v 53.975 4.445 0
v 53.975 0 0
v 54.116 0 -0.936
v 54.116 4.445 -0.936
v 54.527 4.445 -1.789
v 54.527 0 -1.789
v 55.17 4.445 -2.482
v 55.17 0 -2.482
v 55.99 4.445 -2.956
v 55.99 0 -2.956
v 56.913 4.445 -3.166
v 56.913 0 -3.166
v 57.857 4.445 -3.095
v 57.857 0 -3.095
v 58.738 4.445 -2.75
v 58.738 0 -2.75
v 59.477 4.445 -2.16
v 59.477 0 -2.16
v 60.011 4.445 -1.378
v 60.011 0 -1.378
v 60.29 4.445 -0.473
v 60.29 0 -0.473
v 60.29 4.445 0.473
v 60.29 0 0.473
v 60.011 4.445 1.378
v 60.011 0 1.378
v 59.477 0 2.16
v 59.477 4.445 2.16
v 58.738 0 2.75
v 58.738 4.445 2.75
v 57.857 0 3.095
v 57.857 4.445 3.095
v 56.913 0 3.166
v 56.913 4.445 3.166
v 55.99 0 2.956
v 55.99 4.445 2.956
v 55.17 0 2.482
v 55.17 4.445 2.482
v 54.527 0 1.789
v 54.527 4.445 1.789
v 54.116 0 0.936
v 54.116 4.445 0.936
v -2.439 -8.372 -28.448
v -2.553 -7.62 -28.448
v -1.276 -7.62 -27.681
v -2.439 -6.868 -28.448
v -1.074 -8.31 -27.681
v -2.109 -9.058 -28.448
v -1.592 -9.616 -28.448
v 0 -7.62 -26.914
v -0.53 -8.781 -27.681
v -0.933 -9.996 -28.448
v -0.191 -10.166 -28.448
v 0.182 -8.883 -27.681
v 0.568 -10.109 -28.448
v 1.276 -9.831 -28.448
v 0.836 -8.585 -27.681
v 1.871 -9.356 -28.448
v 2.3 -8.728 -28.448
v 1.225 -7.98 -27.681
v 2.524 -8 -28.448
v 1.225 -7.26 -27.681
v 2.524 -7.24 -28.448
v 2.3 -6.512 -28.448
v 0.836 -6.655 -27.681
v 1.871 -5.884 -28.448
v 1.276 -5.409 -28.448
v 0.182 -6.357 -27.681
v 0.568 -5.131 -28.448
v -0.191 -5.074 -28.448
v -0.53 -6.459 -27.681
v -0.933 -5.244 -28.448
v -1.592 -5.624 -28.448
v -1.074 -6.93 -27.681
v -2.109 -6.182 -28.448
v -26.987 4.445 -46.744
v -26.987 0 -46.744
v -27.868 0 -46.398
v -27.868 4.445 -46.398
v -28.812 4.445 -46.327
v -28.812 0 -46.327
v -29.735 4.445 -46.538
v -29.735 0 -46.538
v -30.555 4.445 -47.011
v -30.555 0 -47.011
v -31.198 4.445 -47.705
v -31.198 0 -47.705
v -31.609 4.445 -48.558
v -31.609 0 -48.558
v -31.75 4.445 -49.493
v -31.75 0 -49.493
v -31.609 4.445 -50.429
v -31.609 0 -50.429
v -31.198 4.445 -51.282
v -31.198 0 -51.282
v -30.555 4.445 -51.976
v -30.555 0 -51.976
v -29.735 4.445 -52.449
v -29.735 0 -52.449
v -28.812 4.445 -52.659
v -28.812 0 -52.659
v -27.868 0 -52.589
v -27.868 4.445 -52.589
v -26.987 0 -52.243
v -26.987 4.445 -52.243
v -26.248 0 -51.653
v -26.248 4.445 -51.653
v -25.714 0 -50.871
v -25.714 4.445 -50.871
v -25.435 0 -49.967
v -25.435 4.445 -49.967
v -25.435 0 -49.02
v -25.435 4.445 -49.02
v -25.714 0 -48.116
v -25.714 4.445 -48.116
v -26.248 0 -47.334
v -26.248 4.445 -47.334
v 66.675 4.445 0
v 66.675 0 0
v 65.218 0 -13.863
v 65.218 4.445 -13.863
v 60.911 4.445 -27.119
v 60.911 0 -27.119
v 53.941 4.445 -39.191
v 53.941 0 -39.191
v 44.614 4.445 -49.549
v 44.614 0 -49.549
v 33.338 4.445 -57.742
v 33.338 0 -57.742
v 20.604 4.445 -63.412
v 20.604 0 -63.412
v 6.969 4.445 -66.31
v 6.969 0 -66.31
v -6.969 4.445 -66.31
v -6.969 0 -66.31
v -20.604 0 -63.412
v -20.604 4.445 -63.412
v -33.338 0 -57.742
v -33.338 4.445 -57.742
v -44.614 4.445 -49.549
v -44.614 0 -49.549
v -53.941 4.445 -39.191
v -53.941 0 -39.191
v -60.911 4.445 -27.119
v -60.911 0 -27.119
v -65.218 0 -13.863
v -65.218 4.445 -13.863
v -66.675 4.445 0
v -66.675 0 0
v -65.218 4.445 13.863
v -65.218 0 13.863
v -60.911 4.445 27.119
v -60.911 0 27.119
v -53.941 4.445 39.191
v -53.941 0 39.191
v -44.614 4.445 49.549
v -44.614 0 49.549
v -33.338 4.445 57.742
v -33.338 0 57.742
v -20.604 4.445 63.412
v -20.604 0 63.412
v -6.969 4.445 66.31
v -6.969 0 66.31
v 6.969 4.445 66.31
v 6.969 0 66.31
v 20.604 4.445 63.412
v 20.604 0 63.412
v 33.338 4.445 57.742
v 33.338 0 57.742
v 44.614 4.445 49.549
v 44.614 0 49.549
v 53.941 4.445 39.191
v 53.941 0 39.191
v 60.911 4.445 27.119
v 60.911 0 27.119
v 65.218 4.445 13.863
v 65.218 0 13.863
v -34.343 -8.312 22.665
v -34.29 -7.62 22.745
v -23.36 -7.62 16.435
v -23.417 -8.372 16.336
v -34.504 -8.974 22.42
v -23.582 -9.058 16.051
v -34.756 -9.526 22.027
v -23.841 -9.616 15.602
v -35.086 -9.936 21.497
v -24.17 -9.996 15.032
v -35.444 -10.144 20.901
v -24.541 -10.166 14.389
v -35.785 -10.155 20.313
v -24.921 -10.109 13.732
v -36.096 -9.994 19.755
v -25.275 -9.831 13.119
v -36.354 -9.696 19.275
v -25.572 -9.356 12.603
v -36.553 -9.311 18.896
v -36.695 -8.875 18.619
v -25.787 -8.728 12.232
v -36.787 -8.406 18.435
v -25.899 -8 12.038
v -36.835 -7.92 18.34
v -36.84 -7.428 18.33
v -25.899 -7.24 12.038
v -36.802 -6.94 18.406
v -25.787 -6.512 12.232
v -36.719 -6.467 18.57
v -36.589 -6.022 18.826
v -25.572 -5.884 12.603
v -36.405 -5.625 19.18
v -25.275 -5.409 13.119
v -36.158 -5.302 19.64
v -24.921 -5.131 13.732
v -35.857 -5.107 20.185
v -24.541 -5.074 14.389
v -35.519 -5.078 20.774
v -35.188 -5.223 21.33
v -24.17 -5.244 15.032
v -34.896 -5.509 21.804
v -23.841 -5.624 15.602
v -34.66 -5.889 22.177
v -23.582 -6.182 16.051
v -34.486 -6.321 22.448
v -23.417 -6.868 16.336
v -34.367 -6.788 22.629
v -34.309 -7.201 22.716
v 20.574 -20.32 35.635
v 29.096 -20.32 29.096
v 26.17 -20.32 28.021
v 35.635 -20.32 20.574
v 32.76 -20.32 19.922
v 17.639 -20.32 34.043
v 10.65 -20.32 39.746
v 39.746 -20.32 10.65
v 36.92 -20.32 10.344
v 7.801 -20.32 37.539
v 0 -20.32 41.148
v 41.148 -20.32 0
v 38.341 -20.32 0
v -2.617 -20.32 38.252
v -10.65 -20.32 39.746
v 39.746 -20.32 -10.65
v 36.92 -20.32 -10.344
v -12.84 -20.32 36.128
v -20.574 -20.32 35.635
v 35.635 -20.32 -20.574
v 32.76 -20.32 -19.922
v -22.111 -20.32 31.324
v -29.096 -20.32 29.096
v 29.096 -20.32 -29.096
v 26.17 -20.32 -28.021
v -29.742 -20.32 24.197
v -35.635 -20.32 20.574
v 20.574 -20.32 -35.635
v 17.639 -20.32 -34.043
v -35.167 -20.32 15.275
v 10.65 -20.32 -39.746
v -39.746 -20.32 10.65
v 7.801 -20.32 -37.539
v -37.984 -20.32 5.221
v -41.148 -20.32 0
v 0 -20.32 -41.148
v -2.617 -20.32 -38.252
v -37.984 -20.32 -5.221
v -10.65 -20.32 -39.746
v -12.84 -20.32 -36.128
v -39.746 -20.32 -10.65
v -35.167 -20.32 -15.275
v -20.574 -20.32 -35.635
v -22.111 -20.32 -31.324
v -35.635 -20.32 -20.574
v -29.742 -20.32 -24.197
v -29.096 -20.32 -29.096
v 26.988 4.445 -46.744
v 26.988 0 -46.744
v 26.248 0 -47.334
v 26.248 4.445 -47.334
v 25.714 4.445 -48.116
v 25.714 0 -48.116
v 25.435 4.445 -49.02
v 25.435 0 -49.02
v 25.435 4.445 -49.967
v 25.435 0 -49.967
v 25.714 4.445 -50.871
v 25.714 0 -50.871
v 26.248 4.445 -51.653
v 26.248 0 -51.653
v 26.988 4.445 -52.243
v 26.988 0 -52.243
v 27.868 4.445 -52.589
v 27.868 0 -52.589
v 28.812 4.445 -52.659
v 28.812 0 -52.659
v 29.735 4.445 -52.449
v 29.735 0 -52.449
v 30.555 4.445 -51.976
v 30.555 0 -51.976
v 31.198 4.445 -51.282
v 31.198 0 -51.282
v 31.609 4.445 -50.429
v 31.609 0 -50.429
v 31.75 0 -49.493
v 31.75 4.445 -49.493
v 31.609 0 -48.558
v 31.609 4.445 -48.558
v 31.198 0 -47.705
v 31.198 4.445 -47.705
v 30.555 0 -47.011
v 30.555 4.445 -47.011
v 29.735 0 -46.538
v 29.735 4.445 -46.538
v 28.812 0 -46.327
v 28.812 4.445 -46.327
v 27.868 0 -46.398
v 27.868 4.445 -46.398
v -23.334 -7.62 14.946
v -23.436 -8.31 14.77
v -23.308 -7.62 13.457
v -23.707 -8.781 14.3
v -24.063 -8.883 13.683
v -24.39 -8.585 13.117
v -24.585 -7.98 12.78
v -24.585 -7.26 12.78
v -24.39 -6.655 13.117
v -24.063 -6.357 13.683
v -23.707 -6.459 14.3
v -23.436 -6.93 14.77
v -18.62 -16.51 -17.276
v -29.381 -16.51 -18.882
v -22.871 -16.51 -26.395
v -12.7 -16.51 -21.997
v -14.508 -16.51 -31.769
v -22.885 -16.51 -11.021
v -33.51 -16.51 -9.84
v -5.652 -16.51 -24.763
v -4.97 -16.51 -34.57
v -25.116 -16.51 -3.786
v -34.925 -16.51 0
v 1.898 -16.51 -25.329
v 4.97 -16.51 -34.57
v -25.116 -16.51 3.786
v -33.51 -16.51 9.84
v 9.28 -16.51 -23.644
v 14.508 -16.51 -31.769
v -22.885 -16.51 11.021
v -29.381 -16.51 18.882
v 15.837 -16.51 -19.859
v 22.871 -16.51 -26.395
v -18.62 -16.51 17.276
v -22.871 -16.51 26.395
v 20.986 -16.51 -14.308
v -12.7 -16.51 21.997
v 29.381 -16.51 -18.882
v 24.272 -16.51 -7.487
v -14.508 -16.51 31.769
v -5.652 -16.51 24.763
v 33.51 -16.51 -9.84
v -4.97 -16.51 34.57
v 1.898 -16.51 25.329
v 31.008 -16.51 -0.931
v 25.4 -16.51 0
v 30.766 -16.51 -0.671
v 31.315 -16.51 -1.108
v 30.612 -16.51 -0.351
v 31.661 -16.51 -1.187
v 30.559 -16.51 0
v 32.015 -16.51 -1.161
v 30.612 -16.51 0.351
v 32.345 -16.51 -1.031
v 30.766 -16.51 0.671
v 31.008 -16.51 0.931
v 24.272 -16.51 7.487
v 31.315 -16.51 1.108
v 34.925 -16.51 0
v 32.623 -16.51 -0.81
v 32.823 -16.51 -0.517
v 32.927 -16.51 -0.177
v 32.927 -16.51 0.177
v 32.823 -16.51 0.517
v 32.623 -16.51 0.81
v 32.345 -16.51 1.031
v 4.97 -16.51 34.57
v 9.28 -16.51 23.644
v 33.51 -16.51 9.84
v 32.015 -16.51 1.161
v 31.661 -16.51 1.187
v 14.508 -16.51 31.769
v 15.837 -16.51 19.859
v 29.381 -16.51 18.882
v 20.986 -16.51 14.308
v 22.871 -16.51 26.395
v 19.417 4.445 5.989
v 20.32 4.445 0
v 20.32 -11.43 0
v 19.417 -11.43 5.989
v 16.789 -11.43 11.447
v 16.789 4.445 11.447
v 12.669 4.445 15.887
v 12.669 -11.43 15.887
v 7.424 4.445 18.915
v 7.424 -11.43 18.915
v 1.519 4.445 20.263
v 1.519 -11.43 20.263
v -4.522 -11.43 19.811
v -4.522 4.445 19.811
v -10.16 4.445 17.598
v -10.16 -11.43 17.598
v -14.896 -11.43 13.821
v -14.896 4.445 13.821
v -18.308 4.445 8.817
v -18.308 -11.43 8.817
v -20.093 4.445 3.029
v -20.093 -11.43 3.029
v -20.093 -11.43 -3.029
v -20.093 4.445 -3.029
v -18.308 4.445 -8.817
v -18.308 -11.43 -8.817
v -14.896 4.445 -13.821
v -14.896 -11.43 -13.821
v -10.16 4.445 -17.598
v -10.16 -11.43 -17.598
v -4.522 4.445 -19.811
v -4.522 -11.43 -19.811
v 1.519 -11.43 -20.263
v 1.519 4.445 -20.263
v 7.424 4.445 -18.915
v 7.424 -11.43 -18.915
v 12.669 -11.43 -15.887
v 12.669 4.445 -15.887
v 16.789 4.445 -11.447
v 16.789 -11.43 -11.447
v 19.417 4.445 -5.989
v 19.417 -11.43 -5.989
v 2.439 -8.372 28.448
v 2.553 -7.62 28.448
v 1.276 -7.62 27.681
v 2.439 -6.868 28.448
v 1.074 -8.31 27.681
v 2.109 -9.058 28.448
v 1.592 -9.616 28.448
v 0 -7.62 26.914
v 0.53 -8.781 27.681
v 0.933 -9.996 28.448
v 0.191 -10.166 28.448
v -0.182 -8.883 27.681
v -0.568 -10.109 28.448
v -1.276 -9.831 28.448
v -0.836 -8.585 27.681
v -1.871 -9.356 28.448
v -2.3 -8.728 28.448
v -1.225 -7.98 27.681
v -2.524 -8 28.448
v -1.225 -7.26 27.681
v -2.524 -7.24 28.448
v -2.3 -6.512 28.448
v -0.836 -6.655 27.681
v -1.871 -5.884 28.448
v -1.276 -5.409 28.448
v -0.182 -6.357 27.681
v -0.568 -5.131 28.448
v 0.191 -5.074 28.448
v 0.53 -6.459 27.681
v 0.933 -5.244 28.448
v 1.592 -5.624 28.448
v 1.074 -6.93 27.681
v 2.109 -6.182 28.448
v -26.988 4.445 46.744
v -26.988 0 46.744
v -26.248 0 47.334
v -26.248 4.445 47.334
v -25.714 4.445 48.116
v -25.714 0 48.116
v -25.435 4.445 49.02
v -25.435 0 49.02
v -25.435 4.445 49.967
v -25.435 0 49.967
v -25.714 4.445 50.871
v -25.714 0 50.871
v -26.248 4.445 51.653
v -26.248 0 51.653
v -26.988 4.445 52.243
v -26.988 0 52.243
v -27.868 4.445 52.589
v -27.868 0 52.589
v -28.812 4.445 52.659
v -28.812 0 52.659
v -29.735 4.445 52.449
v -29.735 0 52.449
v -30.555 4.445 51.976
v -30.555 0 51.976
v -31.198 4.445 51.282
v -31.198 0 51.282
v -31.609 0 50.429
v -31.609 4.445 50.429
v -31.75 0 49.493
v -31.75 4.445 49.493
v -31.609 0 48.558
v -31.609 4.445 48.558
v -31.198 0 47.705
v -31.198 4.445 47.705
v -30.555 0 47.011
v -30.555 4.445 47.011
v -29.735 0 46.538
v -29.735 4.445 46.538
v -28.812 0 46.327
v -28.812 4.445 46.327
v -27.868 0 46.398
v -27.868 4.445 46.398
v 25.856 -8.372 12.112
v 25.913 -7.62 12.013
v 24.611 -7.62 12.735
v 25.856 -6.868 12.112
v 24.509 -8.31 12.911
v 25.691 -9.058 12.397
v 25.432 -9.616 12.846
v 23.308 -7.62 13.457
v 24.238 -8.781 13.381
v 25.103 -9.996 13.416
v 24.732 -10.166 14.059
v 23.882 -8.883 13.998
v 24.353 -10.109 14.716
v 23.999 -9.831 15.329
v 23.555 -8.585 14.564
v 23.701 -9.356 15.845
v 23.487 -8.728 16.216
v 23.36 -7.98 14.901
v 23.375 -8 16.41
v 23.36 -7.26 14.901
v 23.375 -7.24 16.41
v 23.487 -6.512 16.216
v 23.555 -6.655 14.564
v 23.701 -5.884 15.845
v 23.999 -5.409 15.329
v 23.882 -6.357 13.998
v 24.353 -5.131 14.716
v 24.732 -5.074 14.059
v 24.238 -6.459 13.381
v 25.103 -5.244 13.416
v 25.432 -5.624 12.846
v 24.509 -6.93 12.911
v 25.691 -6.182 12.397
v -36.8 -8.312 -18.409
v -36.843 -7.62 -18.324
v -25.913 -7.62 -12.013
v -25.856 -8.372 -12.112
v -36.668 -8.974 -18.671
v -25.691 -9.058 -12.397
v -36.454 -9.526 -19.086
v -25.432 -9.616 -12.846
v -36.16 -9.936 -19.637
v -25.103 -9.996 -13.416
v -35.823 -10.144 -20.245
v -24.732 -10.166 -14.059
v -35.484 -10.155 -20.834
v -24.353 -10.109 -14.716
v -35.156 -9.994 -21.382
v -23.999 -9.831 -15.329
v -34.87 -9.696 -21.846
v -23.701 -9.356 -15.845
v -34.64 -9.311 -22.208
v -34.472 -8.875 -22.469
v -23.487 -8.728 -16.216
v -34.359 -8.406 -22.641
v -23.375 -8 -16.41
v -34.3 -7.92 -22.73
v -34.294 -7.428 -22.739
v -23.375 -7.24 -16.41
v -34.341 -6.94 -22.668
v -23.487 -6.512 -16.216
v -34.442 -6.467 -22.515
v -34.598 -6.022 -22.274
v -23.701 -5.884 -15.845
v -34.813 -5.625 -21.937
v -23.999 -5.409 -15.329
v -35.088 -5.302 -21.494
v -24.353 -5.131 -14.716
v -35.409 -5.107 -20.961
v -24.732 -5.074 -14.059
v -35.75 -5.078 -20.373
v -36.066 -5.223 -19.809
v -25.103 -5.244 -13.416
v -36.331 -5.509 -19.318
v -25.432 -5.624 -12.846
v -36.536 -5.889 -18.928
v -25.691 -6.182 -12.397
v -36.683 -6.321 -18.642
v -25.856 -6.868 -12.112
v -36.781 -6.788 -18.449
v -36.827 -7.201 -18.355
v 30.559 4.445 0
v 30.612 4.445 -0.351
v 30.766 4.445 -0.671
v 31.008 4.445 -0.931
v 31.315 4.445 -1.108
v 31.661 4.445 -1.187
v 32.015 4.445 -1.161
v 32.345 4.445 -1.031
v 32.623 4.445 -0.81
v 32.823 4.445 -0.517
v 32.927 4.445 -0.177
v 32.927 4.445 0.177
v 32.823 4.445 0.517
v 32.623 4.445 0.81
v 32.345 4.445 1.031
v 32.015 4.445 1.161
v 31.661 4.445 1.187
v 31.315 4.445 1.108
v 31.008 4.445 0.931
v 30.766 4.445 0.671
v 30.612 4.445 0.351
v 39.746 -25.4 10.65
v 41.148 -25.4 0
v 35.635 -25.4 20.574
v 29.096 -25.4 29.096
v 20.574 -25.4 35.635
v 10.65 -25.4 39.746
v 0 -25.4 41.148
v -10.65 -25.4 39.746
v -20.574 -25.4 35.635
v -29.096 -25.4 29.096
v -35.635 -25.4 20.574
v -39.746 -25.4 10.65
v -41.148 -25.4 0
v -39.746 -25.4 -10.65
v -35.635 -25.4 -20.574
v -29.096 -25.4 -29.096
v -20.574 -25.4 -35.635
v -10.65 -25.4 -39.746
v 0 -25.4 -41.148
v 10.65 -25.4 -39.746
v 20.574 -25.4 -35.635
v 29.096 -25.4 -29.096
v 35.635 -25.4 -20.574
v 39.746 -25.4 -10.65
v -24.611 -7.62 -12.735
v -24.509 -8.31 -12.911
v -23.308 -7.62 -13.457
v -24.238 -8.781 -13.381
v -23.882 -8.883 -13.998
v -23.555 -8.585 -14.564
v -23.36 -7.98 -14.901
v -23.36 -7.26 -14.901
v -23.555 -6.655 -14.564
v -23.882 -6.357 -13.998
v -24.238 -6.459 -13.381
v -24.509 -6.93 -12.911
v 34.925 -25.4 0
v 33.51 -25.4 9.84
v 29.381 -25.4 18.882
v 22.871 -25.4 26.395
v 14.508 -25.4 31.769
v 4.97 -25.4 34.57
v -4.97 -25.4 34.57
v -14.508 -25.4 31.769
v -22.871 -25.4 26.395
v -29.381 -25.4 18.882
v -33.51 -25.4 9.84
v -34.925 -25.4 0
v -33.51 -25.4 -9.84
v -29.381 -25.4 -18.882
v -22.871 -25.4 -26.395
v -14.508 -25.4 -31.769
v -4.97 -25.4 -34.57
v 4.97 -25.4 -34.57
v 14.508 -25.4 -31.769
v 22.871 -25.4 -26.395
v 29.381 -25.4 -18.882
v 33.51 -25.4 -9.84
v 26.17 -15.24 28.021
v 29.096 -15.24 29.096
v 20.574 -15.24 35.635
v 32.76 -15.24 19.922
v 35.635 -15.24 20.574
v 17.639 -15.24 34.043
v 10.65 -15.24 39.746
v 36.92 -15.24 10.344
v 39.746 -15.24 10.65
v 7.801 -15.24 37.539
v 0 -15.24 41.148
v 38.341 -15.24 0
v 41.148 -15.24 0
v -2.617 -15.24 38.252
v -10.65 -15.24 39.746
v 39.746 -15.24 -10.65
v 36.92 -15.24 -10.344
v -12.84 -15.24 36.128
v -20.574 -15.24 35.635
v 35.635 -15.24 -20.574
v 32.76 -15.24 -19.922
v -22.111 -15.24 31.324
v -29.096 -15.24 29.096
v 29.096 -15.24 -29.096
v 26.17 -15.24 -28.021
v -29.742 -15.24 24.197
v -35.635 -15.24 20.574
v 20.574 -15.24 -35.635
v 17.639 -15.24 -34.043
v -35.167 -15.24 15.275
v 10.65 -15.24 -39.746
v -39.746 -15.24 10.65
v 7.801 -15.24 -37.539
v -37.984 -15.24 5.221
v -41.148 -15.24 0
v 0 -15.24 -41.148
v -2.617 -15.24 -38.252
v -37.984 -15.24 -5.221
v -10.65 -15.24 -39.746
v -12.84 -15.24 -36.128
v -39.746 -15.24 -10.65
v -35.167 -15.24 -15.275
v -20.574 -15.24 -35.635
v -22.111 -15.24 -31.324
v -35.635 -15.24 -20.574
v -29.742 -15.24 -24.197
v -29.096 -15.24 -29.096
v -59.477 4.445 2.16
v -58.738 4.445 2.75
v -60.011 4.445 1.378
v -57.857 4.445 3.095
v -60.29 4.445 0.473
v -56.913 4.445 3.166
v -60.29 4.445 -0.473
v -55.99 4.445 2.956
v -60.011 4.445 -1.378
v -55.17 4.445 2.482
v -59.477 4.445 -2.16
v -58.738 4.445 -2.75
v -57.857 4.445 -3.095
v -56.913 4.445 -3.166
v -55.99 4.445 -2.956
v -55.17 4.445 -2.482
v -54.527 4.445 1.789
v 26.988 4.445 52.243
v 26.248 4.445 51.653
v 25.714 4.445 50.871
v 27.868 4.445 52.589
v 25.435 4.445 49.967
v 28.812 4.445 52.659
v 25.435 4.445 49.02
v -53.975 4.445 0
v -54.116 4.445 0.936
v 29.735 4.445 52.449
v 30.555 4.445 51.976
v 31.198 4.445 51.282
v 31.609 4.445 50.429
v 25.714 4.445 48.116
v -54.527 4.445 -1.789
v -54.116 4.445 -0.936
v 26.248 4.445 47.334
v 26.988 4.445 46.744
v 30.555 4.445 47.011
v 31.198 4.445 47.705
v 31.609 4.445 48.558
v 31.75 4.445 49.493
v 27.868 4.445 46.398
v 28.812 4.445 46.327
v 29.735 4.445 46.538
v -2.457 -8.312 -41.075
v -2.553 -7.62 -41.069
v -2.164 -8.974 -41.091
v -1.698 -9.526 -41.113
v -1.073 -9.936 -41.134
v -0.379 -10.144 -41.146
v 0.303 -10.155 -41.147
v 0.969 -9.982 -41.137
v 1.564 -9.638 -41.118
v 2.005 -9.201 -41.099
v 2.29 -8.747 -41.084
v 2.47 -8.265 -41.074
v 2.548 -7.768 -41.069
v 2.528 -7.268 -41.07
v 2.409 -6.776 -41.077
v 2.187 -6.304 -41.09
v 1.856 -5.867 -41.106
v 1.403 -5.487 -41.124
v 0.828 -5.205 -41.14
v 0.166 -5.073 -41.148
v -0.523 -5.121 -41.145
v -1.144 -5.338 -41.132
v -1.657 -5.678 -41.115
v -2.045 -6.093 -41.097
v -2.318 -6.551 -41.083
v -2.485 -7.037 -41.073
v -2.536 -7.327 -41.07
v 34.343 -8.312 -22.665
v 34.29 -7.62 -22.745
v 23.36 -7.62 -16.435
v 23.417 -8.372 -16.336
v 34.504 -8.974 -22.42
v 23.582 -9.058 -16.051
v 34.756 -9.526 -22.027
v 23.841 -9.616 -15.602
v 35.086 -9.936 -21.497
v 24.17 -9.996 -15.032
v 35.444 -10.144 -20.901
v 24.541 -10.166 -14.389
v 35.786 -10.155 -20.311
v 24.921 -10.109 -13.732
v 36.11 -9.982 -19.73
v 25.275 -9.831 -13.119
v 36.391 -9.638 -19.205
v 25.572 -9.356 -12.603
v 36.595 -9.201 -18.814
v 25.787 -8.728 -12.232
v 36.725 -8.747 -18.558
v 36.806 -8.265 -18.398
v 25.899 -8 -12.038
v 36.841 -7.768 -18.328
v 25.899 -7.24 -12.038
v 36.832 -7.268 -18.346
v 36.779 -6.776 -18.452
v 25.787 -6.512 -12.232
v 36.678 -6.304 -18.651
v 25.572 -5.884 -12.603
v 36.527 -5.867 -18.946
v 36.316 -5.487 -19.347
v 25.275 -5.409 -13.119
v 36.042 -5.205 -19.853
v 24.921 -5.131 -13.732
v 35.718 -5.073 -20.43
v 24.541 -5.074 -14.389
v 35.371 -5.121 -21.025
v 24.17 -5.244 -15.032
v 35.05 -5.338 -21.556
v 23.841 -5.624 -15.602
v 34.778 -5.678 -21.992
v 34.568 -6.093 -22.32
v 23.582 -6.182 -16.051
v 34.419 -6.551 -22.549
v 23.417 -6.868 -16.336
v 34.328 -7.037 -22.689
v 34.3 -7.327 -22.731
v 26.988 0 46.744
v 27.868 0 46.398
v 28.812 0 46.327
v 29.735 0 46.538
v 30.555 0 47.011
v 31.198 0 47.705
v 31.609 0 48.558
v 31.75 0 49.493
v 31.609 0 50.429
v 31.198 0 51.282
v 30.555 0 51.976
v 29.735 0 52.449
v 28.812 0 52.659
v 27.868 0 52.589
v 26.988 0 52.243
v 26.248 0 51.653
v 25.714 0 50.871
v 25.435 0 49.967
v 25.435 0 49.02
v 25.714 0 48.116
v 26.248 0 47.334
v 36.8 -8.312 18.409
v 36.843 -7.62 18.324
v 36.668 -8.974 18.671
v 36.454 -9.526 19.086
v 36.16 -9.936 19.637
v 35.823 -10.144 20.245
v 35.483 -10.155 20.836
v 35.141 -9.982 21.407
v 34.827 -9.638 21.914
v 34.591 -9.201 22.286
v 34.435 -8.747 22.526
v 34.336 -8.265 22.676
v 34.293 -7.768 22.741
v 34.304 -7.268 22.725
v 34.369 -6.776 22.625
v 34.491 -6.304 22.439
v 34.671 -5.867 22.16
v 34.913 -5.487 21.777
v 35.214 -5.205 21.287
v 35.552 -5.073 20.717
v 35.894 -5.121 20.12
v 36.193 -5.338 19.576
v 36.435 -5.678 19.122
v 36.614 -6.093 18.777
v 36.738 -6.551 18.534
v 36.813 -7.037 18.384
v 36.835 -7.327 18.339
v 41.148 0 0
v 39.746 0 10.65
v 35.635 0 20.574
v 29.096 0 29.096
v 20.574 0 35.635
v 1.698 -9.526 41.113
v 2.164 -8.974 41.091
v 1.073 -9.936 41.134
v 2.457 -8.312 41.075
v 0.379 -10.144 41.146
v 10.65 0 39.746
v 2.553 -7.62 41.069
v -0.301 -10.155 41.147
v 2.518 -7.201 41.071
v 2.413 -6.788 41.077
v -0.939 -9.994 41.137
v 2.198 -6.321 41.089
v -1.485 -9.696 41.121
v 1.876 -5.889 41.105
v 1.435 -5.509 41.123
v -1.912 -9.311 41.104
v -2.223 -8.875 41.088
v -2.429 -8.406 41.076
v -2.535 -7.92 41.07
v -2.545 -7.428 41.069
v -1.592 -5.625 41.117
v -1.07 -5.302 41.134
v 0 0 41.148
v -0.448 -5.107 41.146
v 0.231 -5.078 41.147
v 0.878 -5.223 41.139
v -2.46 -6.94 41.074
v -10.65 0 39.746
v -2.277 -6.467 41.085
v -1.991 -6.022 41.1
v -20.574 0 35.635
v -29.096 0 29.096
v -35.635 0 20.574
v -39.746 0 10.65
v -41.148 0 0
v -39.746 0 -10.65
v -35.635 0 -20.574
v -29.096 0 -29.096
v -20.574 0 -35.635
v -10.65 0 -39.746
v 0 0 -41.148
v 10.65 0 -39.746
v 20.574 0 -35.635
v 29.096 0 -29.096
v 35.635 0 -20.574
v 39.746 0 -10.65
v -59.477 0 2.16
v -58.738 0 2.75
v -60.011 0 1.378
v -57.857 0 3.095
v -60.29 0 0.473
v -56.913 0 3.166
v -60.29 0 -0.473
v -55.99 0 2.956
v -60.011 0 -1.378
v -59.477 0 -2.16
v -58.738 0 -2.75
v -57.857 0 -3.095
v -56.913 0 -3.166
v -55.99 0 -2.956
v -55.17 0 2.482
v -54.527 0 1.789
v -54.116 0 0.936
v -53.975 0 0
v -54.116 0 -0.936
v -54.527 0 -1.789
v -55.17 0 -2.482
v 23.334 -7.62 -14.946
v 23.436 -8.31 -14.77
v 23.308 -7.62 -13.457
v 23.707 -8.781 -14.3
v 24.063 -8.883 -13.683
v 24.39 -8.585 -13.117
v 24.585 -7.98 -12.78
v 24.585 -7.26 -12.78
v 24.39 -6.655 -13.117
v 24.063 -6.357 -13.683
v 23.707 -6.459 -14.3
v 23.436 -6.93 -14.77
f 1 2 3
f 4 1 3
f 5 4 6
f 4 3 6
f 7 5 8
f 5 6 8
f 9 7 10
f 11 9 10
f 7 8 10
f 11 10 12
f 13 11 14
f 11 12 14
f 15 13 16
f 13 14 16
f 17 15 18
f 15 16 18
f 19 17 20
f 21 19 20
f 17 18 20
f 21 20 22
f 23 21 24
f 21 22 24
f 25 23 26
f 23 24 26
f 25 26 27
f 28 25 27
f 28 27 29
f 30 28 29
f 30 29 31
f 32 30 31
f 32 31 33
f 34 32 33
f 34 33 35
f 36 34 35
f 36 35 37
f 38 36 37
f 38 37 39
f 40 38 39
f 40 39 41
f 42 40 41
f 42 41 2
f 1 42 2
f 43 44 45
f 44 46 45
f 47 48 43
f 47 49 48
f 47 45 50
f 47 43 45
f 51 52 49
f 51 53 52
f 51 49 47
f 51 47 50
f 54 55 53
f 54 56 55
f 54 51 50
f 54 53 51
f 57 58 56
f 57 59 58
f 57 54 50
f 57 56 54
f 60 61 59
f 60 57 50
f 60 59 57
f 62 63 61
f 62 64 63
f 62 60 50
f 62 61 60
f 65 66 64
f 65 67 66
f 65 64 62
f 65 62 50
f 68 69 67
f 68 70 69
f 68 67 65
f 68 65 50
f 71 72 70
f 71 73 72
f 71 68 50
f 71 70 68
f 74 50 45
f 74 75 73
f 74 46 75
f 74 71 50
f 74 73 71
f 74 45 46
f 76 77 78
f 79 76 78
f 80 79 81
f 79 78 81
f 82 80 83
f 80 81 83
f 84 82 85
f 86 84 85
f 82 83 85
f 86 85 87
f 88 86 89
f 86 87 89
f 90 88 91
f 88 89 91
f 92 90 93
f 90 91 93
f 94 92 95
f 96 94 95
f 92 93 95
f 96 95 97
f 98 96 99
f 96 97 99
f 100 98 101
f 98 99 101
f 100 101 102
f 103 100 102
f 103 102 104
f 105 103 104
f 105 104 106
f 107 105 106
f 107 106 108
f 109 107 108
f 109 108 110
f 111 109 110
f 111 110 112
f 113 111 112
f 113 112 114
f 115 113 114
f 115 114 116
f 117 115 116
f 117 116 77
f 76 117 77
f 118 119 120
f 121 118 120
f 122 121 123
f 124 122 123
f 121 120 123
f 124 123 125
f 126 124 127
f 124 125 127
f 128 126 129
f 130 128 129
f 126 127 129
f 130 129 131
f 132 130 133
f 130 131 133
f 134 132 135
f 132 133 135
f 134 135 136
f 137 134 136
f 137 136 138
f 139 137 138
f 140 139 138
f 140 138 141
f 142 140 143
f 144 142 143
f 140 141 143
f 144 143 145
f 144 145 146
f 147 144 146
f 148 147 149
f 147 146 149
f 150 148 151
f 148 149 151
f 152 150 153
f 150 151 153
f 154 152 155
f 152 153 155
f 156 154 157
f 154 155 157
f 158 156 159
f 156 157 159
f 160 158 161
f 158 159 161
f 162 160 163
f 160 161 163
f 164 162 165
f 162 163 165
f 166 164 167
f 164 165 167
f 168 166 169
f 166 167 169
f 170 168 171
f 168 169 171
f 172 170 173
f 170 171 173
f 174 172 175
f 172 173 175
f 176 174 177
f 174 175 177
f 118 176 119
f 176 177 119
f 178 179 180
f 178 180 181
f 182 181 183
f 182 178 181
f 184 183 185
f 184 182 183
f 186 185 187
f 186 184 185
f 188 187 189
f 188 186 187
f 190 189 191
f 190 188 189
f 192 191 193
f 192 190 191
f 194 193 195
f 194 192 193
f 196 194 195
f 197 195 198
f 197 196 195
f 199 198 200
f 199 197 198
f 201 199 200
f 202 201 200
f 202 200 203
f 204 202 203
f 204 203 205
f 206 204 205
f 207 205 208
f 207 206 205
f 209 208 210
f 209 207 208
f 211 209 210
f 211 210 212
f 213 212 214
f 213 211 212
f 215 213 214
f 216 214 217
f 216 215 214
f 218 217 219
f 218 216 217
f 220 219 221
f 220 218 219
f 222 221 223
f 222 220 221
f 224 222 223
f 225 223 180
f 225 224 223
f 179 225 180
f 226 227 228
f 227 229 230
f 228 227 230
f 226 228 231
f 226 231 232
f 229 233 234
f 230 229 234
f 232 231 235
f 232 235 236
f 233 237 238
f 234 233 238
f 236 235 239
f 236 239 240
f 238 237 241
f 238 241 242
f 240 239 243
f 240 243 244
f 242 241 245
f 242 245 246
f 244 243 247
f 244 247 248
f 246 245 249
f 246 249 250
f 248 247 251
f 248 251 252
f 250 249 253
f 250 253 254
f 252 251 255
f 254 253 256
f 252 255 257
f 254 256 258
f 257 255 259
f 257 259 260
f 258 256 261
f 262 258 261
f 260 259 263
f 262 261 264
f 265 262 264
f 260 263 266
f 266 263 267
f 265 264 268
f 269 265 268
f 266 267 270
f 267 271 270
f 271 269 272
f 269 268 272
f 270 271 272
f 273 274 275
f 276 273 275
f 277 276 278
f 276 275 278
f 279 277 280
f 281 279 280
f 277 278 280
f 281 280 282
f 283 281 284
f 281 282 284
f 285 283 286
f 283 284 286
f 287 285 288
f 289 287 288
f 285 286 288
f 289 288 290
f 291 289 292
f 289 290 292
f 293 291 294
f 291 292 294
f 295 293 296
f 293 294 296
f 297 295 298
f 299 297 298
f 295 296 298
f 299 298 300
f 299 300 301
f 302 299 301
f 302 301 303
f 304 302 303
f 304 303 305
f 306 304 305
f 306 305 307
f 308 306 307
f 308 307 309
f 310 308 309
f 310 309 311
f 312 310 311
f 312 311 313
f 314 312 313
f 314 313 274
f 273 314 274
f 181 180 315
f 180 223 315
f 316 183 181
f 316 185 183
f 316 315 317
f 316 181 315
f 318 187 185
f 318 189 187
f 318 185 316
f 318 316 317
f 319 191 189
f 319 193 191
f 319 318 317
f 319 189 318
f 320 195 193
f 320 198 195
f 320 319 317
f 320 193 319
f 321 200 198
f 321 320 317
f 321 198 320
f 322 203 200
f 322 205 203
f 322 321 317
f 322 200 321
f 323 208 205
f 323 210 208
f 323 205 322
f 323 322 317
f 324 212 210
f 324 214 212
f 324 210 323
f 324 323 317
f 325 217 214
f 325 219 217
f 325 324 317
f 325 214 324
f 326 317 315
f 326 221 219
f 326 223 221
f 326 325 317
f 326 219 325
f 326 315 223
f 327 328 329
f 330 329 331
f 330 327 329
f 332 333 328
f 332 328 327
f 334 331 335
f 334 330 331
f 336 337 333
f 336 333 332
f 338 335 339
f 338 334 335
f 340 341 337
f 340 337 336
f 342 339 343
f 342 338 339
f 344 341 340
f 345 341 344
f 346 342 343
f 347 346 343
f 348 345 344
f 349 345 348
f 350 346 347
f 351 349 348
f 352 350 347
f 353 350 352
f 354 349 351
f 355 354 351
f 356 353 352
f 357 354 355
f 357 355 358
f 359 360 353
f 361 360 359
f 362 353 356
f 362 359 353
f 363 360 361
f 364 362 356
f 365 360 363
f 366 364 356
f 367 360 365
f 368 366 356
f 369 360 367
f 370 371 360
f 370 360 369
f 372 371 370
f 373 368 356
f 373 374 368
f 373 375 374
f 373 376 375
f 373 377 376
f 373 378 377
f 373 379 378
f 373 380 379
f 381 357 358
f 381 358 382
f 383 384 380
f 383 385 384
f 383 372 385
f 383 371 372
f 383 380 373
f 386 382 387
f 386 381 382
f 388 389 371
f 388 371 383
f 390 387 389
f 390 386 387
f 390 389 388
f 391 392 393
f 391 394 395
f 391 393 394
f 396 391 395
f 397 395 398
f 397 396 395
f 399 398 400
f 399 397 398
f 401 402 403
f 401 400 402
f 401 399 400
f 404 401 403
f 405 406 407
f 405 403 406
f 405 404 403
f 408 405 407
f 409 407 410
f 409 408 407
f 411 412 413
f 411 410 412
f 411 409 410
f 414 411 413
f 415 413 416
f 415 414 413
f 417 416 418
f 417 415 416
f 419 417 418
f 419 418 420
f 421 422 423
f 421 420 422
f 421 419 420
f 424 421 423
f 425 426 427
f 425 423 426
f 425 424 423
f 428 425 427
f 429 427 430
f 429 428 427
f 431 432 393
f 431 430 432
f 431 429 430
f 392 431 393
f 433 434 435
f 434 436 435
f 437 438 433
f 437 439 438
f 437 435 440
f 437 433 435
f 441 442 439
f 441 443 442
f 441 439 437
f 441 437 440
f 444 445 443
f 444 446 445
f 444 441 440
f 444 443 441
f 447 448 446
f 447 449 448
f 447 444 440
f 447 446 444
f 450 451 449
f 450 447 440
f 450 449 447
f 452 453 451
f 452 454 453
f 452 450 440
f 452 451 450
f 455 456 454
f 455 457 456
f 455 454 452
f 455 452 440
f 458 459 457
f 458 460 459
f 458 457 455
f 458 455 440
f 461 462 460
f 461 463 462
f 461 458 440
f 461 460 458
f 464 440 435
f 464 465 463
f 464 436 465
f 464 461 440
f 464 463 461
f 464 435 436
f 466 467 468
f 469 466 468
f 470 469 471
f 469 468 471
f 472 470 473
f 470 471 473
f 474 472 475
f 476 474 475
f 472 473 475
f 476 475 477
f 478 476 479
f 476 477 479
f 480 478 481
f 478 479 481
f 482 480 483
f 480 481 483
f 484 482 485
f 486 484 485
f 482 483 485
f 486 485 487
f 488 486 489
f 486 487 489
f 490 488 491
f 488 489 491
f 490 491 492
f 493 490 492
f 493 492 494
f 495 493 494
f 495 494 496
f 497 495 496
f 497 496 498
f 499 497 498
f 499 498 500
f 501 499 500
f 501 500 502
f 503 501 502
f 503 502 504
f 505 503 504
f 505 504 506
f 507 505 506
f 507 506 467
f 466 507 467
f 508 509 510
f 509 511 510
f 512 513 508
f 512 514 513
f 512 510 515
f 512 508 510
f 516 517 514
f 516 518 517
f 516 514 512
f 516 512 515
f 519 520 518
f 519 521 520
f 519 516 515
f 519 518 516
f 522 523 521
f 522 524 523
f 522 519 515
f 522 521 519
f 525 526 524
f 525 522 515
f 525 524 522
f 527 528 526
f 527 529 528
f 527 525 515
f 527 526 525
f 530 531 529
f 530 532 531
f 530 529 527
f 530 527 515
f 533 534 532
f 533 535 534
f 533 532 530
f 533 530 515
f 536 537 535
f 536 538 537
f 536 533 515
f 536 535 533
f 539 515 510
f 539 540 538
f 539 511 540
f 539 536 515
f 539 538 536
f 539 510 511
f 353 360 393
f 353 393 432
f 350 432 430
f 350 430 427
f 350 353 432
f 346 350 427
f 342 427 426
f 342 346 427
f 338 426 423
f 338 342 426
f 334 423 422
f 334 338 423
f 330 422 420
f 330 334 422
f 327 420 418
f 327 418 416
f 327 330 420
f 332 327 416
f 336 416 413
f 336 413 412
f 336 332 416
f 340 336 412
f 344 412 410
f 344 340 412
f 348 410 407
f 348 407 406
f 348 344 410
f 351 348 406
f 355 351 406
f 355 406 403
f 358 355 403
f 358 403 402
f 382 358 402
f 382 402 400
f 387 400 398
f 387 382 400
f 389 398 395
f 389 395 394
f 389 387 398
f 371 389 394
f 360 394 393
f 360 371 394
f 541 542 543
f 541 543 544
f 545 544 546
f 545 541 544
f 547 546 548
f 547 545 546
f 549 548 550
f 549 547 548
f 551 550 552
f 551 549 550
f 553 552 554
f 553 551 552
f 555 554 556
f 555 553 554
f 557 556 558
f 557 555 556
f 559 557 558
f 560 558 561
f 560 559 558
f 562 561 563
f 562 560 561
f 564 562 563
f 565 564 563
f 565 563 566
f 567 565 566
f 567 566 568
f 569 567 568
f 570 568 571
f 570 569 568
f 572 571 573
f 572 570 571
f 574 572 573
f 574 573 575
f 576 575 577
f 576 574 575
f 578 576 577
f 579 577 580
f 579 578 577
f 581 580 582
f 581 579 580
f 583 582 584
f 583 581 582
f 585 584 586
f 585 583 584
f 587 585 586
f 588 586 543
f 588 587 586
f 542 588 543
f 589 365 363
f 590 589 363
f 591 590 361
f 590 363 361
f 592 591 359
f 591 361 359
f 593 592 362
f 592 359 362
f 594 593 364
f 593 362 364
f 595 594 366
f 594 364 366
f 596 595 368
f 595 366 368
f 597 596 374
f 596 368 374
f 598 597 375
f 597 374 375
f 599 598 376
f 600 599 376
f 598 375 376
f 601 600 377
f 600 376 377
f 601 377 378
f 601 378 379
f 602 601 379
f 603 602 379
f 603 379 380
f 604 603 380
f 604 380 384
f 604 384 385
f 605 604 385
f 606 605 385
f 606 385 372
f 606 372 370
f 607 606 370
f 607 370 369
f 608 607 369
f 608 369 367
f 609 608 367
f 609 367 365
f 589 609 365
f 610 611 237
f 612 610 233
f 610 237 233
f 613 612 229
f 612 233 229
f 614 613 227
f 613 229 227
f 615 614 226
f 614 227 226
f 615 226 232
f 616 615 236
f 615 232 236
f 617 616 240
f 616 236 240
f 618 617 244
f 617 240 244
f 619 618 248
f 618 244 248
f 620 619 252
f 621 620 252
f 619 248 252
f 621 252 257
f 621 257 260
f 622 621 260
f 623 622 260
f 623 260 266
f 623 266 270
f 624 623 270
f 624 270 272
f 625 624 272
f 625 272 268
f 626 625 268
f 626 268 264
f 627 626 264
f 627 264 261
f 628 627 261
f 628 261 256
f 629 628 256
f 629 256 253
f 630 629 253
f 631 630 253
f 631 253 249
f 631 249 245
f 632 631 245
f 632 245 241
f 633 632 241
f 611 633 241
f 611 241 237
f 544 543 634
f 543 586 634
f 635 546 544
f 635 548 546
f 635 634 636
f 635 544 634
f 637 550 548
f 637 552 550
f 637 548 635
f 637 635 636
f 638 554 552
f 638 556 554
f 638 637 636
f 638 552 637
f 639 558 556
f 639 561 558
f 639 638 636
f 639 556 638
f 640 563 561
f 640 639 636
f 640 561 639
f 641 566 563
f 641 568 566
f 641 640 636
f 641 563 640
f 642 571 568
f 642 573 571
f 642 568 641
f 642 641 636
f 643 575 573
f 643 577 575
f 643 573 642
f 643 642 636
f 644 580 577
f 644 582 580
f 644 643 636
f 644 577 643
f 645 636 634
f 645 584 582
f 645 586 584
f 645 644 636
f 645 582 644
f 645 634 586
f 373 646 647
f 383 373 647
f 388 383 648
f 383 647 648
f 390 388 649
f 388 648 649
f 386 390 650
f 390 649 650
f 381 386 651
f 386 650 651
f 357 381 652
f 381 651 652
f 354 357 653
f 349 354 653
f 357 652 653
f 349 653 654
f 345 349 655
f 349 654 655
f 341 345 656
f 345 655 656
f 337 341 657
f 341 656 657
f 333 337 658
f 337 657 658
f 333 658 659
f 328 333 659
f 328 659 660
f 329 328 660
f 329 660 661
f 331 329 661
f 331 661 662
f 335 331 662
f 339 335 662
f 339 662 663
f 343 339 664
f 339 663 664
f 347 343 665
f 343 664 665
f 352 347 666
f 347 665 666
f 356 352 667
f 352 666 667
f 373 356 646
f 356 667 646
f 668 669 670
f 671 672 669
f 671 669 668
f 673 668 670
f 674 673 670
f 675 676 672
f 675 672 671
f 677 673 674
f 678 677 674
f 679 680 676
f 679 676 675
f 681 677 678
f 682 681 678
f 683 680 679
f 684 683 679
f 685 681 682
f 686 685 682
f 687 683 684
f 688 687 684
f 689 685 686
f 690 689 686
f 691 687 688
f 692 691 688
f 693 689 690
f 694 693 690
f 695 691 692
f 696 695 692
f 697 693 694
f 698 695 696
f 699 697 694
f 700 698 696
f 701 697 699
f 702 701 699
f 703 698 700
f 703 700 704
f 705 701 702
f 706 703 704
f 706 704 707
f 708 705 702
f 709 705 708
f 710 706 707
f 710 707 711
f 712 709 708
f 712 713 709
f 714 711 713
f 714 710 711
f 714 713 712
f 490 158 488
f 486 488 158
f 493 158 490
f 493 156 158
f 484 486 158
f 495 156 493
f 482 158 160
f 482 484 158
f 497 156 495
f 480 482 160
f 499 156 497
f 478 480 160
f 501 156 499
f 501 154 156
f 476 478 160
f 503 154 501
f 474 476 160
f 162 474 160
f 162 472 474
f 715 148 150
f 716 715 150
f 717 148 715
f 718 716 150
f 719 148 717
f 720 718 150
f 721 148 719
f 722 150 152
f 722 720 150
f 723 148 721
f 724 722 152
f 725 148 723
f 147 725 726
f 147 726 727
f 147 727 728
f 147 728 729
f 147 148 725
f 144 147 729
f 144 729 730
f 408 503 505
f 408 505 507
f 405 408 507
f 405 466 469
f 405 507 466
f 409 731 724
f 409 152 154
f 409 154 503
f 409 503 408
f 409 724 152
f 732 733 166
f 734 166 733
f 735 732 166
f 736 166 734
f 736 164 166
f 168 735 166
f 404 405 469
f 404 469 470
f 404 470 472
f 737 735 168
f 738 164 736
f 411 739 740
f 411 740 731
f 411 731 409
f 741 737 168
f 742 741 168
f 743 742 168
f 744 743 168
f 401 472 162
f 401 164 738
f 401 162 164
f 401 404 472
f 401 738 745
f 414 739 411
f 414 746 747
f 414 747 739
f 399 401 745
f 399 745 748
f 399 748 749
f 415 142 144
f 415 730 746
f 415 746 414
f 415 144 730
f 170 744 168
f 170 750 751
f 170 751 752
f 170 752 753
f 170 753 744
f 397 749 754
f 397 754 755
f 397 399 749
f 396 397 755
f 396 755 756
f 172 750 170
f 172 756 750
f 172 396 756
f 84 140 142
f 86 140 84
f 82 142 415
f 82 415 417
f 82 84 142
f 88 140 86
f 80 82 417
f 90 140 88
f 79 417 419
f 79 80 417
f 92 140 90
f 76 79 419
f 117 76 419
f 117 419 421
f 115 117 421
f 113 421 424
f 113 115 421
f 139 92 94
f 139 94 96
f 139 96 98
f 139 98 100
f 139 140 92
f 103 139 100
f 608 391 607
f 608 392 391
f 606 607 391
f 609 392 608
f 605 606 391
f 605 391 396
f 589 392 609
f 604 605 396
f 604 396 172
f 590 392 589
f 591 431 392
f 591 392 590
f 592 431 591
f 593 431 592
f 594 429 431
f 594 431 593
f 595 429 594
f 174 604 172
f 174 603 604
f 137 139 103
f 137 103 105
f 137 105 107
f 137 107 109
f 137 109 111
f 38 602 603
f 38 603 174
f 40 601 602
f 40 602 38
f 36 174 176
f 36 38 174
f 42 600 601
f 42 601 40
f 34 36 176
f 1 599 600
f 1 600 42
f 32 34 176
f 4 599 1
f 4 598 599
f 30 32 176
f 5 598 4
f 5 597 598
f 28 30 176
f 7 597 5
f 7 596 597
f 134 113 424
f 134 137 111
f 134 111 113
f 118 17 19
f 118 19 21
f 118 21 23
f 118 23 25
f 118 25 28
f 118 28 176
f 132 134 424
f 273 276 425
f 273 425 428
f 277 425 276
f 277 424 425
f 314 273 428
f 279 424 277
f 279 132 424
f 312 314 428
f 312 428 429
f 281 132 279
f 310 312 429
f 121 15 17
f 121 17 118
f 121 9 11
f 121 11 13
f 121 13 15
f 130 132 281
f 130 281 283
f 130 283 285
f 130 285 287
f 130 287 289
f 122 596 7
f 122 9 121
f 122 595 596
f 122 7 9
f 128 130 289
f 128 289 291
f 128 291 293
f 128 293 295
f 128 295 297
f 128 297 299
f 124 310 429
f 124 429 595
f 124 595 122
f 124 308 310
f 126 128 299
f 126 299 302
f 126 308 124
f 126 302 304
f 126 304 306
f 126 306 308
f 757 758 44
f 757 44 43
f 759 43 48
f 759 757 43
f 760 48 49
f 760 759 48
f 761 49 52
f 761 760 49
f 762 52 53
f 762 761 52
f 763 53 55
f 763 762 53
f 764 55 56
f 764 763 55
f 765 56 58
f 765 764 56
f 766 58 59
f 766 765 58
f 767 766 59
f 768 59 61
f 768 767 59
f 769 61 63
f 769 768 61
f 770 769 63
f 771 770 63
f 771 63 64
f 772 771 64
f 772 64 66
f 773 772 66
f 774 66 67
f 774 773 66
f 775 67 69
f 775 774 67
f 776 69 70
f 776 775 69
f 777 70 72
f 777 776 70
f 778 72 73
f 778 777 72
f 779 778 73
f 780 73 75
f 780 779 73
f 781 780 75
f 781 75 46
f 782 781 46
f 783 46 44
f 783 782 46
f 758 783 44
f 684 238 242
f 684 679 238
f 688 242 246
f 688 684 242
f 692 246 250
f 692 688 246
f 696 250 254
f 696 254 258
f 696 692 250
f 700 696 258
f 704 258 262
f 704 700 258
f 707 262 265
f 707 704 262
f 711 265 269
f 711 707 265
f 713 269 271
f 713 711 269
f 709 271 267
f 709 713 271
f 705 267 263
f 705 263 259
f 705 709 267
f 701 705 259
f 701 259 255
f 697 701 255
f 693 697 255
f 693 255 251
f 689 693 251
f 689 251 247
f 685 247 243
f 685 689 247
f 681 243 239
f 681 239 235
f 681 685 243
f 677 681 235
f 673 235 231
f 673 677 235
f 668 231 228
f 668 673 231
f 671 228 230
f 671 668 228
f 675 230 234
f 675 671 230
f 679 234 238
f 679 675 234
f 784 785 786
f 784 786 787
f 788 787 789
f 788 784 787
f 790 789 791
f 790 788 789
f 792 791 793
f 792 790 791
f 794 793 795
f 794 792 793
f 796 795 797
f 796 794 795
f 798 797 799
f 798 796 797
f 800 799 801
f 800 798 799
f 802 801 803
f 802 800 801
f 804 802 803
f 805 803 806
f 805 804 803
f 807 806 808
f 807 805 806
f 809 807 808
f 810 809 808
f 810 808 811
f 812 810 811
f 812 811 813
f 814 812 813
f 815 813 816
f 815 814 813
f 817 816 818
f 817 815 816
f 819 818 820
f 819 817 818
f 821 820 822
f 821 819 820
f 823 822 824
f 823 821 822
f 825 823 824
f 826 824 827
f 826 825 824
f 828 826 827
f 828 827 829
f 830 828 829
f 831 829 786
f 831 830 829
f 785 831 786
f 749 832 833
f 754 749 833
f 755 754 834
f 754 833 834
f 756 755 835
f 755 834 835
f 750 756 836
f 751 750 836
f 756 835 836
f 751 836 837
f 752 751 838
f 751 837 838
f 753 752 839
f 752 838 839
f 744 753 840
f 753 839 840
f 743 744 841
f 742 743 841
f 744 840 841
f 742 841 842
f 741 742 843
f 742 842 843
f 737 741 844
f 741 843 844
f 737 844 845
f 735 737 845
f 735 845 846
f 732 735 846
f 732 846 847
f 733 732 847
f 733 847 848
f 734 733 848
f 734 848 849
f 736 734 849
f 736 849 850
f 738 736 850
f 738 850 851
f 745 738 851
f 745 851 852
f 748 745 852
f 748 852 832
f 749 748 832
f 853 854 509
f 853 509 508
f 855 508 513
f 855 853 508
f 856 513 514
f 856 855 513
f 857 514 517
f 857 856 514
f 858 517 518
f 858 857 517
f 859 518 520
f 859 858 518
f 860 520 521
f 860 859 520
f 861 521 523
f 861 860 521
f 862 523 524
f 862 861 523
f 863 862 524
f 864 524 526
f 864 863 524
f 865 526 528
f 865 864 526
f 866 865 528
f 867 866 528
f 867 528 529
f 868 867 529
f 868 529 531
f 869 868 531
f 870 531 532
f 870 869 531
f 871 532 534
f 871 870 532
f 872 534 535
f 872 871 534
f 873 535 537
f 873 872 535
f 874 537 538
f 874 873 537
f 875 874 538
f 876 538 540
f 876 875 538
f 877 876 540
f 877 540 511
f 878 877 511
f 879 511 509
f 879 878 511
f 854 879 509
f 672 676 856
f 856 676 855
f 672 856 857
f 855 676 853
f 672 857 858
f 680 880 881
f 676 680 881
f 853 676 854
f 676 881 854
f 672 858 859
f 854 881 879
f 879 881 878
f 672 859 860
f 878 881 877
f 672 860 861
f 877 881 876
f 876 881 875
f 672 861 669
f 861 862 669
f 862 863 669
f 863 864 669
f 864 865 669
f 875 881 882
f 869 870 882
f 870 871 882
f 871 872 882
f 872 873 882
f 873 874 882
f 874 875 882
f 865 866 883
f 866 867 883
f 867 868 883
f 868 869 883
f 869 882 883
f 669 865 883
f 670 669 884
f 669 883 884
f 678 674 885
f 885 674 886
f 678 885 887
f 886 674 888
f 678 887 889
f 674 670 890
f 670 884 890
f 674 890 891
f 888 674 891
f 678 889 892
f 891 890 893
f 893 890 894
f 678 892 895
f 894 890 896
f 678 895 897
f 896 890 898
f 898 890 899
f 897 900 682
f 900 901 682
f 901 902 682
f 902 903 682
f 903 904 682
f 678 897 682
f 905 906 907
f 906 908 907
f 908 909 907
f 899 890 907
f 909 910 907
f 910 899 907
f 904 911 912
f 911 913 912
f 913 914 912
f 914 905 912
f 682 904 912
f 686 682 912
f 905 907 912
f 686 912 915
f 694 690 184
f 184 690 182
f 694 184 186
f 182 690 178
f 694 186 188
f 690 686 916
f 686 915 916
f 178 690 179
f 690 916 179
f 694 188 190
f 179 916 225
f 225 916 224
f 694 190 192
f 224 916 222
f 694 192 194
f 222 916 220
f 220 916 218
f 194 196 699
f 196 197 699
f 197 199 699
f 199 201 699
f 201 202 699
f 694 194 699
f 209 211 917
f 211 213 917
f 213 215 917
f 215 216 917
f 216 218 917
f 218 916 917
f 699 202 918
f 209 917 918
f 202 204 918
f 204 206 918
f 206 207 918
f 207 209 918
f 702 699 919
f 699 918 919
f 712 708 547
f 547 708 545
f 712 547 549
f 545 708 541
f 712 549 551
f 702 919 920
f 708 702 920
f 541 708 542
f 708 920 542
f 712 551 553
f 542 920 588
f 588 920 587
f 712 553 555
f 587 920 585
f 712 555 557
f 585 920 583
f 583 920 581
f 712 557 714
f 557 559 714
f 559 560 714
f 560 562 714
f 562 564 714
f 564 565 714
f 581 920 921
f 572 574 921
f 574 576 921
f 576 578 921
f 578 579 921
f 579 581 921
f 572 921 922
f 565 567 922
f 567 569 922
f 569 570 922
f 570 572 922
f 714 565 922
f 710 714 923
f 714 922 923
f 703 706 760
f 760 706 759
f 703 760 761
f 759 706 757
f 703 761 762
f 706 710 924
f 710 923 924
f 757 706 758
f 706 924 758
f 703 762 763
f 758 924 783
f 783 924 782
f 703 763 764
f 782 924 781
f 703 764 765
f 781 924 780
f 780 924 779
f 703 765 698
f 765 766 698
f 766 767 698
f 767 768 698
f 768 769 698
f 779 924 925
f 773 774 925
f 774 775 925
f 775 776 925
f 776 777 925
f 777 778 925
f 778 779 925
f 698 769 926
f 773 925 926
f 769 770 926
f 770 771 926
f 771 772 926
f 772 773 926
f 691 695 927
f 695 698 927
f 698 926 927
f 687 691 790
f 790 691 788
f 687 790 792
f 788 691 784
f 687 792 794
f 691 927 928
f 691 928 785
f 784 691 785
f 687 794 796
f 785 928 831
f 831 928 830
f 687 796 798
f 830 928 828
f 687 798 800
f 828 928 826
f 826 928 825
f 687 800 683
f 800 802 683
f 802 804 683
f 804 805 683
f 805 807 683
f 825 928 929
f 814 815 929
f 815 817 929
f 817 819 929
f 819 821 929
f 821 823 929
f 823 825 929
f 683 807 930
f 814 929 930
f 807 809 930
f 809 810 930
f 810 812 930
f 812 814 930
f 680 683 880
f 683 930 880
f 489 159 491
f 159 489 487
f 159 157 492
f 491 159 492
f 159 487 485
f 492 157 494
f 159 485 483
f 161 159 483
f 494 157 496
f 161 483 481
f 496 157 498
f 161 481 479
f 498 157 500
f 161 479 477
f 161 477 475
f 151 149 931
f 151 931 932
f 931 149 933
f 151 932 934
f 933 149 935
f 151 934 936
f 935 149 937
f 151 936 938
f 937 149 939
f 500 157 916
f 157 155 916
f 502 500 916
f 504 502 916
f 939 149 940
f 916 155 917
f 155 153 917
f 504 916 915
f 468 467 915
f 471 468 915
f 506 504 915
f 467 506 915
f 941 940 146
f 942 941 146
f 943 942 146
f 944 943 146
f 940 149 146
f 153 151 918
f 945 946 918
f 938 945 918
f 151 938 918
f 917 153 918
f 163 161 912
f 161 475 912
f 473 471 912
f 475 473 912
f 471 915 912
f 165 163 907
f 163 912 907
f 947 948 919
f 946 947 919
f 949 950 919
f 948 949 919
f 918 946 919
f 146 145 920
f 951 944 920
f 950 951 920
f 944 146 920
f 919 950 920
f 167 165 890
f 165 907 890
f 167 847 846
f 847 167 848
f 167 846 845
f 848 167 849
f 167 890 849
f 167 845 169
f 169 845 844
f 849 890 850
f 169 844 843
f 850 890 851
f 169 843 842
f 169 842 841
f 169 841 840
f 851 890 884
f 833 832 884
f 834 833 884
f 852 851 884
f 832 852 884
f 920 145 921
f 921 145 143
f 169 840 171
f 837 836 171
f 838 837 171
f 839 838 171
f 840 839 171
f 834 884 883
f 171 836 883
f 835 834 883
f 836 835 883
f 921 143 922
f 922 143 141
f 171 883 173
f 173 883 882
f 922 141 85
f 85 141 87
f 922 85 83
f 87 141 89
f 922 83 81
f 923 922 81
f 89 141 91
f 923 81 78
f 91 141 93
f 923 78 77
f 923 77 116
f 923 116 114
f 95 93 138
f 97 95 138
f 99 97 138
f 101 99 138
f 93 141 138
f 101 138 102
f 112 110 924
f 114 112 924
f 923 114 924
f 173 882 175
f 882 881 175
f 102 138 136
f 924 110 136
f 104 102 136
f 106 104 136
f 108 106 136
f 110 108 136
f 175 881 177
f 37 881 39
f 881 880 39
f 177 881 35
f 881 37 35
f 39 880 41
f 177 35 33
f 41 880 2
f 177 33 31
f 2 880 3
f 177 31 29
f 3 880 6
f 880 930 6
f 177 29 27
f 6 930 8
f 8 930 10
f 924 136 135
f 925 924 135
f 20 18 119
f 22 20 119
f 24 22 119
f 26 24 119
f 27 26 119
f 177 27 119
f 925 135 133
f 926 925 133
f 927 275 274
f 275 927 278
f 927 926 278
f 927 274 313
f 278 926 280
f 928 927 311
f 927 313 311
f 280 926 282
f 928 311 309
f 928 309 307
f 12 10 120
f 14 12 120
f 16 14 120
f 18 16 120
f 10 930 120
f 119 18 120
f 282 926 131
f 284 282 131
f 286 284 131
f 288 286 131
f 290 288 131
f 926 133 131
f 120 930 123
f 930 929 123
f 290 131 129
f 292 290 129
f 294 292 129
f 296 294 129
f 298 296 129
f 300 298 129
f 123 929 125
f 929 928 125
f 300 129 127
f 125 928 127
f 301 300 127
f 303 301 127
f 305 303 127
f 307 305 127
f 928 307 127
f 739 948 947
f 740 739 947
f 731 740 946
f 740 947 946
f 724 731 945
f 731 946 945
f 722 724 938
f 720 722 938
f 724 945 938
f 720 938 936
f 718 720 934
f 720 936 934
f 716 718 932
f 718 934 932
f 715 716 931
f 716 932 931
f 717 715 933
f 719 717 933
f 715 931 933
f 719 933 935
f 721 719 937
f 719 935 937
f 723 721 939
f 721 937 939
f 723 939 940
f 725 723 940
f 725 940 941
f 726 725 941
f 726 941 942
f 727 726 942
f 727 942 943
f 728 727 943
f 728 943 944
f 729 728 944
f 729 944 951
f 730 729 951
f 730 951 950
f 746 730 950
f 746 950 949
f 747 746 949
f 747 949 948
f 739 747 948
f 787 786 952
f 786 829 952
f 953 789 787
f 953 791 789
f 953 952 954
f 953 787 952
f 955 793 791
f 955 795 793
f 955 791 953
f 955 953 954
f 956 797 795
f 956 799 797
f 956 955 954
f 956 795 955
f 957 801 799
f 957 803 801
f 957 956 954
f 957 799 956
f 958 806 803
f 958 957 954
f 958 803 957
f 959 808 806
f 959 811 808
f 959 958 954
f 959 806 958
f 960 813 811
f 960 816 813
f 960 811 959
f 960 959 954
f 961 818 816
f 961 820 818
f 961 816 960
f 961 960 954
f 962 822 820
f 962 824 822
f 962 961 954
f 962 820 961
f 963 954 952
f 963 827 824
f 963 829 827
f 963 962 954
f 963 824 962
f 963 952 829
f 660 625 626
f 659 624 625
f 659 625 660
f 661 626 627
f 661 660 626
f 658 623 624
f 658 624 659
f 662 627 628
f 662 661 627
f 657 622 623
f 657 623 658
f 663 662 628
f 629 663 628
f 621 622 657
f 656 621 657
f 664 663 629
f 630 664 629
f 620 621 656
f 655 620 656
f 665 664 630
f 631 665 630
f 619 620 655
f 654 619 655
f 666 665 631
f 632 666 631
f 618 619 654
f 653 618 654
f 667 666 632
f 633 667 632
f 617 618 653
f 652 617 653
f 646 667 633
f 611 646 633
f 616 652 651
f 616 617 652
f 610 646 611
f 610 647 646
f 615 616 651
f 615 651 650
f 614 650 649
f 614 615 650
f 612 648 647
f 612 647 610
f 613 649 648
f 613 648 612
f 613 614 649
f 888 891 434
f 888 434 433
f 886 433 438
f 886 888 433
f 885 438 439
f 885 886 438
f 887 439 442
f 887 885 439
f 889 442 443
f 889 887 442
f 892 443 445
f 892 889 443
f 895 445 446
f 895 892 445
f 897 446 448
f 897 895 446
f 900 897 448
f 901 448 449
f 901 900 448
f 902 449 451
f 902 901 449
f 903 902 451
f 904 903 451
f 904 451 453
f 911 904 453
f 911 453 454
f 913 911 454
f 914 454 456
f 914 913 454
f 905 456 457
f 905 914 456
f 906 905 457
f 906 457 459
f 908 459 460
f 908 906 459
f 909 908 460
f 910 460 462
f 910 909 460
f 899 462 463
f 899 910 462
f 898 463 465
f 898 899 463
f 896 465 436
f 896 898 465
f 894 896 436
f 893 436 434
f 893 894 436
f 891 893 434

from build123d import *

# Parameters (mm, degrees)
SKETCH1_R                       = 66.675
SKETCH1_R_2                     = 20.32
BOSS_EXTRUDE1_DEPTH             = 4.445
F_1_4_0_25_DIAMETER_HOLE1_D     = 6.35
F_1_4_0_25_DIAMETER_HOLE1_DEPTH = 4.446
CIRPATTERN1_COUNT               = 6
SKETCH6_R                       = 41.148
SKETCH6_R_2                     = 20.32
BOSS_EXTRUDE2_DEPTH             = 25.4
SKETCH9_W                       = 2.9337
SKETCH9_H                       = 5.08
CIRPATTERN2_COUNT               = 6
F_3_32_0_09375_DIAMETER_HOLE1_D = 2.38125
SKETCH13_R                      = 34.925
CUT_EXTRUDE1_DEPTH              = 8.89
CHAMFER2_SIZE                   = 5.08


with BuildPart() as part:
    # Sketch1 → Boss-Extrude1 (new body)
    with BuildSketch(Plane(origin=(0, 0, 0), x_dir=(1, 0, 0), z_dir=(0, 1, 0))):
        Circle(SKETCH1_R)
        Circle(SKETCH1_R_2, mode=Mode.SUBTRACT)
    extrude(amount=BOSS_EXTRUDE1_DEPTH)

    # 1/4 (0.25) Diameter Hole1
    with Locations(Plane(origin=(0, 4.445, 0), x_dir=(1, 0, 0), z_dir=(0, 1, 0))):
        with Locations((57.15, 0)):
            f_1_4_0_25_diameter_hole1 = Hole(F_1_4_0_25_DIAMETER_HOLE1_D / 2, depth=F_1_4_0_25_DIAMETER_HOLE1_DEPTH)

    # CirPattern1: 1/4 (0.25) Diameter Hole1 ×6 about axis
    cirpattern1_axis = Axis((0, 0, 0), (0, 1, 0))
    for i in range(1, CIRPATTERN1_COUNT):
        add(f_1_4_0_25_diameter_hole1.rotate(cirpattern1_axis, i * 360 / CIRPATTERN1_COUNT), mode=Mode.SUBTRACT)

    # Sketch6 → Boss-Extrude2 (add)
    with BuildSketch(Plane.XZ):
        Circle(SKETCH6_R)
        Circle(SKETCH6_R_2, mode=Mode.SUBTRACT)
    extrude(amount=BOSS_EXTRUDE2_DEPTH)

    # Sketch9 → Cut-Revolve3 (revolve, cut)
    with BuildSketch(Plane.XY):
        with Locations((39.80815, -17.78)):
            Rectangle(SKETCH9_W, SKETCH9_H)
    revolve(axis=Axis((0, -0.47625, 0), (0, 1, 0)), mode=Mode.SUBTRACT)

    # Sketch10 → 1/4-20 Tapped Hole1 (revolve, cut)
    with BuildSketch(Plane(origin=(-35.635213315, -7.62, 20.574), x_dir=(0.5, 0, 0.866025404), z_dir=(0, 1, 0))):
        Polygon((0, 0), (0, 14.233816902), (2.5527, 12.7), (2.5527, 0), align=None)
    f_1_4_20_tapped_hole1 = revolve(axis=Axis((-41.134474629, -7.62, 23.749), (0.866025404, 0, -0.5)), mode=Mode.SUBTRACT)

    # CirPattern2: 1/4-20 Tapped Hole1 ×6 about axis
    cirpattern2_axis = Axis((0, -0.47625, 0), (0, 1, 0))
    for i in range(1, CIRPATTERN2_COUNT):
        add(f_1_4_20_tapped_hole1.rotate(cirpattern2_axis, i * 360 / CIRPATTERN2_COUNT), mode=Mode.SUBTRACT)

    # 3/32 (0.09375) Diameter Hole1 (through all)
    with Locations(Plane(origin=(0, 4.445, 0), x_dir=(1, 0, 0), z_dir=(0, 1, 0))):
        with Locations((31.75, 0)):
            Hole(F_3_32_0_09375_DIAMETER_HOLE1_D / 2)

    # Sketch13 → Cut-Extrude1 (cut)
    with BuildSketch(Plane.XZ.offset(25.4)):
        Circle(SKETCH13_R)
    extrude(amount=-CUT_EXTRUDE1_DEPTH, mode=Mode.SUBTRACT)

    # Chamfer2
    chamfer2_edges = [part.edges().sort_by_distance(p)[0] for p in [
        (-20.32, -16.51, 0),
    ]]
    chamfer(chamfer2_edges, length=CHAMFER2_SIZE)


solid = part.part
